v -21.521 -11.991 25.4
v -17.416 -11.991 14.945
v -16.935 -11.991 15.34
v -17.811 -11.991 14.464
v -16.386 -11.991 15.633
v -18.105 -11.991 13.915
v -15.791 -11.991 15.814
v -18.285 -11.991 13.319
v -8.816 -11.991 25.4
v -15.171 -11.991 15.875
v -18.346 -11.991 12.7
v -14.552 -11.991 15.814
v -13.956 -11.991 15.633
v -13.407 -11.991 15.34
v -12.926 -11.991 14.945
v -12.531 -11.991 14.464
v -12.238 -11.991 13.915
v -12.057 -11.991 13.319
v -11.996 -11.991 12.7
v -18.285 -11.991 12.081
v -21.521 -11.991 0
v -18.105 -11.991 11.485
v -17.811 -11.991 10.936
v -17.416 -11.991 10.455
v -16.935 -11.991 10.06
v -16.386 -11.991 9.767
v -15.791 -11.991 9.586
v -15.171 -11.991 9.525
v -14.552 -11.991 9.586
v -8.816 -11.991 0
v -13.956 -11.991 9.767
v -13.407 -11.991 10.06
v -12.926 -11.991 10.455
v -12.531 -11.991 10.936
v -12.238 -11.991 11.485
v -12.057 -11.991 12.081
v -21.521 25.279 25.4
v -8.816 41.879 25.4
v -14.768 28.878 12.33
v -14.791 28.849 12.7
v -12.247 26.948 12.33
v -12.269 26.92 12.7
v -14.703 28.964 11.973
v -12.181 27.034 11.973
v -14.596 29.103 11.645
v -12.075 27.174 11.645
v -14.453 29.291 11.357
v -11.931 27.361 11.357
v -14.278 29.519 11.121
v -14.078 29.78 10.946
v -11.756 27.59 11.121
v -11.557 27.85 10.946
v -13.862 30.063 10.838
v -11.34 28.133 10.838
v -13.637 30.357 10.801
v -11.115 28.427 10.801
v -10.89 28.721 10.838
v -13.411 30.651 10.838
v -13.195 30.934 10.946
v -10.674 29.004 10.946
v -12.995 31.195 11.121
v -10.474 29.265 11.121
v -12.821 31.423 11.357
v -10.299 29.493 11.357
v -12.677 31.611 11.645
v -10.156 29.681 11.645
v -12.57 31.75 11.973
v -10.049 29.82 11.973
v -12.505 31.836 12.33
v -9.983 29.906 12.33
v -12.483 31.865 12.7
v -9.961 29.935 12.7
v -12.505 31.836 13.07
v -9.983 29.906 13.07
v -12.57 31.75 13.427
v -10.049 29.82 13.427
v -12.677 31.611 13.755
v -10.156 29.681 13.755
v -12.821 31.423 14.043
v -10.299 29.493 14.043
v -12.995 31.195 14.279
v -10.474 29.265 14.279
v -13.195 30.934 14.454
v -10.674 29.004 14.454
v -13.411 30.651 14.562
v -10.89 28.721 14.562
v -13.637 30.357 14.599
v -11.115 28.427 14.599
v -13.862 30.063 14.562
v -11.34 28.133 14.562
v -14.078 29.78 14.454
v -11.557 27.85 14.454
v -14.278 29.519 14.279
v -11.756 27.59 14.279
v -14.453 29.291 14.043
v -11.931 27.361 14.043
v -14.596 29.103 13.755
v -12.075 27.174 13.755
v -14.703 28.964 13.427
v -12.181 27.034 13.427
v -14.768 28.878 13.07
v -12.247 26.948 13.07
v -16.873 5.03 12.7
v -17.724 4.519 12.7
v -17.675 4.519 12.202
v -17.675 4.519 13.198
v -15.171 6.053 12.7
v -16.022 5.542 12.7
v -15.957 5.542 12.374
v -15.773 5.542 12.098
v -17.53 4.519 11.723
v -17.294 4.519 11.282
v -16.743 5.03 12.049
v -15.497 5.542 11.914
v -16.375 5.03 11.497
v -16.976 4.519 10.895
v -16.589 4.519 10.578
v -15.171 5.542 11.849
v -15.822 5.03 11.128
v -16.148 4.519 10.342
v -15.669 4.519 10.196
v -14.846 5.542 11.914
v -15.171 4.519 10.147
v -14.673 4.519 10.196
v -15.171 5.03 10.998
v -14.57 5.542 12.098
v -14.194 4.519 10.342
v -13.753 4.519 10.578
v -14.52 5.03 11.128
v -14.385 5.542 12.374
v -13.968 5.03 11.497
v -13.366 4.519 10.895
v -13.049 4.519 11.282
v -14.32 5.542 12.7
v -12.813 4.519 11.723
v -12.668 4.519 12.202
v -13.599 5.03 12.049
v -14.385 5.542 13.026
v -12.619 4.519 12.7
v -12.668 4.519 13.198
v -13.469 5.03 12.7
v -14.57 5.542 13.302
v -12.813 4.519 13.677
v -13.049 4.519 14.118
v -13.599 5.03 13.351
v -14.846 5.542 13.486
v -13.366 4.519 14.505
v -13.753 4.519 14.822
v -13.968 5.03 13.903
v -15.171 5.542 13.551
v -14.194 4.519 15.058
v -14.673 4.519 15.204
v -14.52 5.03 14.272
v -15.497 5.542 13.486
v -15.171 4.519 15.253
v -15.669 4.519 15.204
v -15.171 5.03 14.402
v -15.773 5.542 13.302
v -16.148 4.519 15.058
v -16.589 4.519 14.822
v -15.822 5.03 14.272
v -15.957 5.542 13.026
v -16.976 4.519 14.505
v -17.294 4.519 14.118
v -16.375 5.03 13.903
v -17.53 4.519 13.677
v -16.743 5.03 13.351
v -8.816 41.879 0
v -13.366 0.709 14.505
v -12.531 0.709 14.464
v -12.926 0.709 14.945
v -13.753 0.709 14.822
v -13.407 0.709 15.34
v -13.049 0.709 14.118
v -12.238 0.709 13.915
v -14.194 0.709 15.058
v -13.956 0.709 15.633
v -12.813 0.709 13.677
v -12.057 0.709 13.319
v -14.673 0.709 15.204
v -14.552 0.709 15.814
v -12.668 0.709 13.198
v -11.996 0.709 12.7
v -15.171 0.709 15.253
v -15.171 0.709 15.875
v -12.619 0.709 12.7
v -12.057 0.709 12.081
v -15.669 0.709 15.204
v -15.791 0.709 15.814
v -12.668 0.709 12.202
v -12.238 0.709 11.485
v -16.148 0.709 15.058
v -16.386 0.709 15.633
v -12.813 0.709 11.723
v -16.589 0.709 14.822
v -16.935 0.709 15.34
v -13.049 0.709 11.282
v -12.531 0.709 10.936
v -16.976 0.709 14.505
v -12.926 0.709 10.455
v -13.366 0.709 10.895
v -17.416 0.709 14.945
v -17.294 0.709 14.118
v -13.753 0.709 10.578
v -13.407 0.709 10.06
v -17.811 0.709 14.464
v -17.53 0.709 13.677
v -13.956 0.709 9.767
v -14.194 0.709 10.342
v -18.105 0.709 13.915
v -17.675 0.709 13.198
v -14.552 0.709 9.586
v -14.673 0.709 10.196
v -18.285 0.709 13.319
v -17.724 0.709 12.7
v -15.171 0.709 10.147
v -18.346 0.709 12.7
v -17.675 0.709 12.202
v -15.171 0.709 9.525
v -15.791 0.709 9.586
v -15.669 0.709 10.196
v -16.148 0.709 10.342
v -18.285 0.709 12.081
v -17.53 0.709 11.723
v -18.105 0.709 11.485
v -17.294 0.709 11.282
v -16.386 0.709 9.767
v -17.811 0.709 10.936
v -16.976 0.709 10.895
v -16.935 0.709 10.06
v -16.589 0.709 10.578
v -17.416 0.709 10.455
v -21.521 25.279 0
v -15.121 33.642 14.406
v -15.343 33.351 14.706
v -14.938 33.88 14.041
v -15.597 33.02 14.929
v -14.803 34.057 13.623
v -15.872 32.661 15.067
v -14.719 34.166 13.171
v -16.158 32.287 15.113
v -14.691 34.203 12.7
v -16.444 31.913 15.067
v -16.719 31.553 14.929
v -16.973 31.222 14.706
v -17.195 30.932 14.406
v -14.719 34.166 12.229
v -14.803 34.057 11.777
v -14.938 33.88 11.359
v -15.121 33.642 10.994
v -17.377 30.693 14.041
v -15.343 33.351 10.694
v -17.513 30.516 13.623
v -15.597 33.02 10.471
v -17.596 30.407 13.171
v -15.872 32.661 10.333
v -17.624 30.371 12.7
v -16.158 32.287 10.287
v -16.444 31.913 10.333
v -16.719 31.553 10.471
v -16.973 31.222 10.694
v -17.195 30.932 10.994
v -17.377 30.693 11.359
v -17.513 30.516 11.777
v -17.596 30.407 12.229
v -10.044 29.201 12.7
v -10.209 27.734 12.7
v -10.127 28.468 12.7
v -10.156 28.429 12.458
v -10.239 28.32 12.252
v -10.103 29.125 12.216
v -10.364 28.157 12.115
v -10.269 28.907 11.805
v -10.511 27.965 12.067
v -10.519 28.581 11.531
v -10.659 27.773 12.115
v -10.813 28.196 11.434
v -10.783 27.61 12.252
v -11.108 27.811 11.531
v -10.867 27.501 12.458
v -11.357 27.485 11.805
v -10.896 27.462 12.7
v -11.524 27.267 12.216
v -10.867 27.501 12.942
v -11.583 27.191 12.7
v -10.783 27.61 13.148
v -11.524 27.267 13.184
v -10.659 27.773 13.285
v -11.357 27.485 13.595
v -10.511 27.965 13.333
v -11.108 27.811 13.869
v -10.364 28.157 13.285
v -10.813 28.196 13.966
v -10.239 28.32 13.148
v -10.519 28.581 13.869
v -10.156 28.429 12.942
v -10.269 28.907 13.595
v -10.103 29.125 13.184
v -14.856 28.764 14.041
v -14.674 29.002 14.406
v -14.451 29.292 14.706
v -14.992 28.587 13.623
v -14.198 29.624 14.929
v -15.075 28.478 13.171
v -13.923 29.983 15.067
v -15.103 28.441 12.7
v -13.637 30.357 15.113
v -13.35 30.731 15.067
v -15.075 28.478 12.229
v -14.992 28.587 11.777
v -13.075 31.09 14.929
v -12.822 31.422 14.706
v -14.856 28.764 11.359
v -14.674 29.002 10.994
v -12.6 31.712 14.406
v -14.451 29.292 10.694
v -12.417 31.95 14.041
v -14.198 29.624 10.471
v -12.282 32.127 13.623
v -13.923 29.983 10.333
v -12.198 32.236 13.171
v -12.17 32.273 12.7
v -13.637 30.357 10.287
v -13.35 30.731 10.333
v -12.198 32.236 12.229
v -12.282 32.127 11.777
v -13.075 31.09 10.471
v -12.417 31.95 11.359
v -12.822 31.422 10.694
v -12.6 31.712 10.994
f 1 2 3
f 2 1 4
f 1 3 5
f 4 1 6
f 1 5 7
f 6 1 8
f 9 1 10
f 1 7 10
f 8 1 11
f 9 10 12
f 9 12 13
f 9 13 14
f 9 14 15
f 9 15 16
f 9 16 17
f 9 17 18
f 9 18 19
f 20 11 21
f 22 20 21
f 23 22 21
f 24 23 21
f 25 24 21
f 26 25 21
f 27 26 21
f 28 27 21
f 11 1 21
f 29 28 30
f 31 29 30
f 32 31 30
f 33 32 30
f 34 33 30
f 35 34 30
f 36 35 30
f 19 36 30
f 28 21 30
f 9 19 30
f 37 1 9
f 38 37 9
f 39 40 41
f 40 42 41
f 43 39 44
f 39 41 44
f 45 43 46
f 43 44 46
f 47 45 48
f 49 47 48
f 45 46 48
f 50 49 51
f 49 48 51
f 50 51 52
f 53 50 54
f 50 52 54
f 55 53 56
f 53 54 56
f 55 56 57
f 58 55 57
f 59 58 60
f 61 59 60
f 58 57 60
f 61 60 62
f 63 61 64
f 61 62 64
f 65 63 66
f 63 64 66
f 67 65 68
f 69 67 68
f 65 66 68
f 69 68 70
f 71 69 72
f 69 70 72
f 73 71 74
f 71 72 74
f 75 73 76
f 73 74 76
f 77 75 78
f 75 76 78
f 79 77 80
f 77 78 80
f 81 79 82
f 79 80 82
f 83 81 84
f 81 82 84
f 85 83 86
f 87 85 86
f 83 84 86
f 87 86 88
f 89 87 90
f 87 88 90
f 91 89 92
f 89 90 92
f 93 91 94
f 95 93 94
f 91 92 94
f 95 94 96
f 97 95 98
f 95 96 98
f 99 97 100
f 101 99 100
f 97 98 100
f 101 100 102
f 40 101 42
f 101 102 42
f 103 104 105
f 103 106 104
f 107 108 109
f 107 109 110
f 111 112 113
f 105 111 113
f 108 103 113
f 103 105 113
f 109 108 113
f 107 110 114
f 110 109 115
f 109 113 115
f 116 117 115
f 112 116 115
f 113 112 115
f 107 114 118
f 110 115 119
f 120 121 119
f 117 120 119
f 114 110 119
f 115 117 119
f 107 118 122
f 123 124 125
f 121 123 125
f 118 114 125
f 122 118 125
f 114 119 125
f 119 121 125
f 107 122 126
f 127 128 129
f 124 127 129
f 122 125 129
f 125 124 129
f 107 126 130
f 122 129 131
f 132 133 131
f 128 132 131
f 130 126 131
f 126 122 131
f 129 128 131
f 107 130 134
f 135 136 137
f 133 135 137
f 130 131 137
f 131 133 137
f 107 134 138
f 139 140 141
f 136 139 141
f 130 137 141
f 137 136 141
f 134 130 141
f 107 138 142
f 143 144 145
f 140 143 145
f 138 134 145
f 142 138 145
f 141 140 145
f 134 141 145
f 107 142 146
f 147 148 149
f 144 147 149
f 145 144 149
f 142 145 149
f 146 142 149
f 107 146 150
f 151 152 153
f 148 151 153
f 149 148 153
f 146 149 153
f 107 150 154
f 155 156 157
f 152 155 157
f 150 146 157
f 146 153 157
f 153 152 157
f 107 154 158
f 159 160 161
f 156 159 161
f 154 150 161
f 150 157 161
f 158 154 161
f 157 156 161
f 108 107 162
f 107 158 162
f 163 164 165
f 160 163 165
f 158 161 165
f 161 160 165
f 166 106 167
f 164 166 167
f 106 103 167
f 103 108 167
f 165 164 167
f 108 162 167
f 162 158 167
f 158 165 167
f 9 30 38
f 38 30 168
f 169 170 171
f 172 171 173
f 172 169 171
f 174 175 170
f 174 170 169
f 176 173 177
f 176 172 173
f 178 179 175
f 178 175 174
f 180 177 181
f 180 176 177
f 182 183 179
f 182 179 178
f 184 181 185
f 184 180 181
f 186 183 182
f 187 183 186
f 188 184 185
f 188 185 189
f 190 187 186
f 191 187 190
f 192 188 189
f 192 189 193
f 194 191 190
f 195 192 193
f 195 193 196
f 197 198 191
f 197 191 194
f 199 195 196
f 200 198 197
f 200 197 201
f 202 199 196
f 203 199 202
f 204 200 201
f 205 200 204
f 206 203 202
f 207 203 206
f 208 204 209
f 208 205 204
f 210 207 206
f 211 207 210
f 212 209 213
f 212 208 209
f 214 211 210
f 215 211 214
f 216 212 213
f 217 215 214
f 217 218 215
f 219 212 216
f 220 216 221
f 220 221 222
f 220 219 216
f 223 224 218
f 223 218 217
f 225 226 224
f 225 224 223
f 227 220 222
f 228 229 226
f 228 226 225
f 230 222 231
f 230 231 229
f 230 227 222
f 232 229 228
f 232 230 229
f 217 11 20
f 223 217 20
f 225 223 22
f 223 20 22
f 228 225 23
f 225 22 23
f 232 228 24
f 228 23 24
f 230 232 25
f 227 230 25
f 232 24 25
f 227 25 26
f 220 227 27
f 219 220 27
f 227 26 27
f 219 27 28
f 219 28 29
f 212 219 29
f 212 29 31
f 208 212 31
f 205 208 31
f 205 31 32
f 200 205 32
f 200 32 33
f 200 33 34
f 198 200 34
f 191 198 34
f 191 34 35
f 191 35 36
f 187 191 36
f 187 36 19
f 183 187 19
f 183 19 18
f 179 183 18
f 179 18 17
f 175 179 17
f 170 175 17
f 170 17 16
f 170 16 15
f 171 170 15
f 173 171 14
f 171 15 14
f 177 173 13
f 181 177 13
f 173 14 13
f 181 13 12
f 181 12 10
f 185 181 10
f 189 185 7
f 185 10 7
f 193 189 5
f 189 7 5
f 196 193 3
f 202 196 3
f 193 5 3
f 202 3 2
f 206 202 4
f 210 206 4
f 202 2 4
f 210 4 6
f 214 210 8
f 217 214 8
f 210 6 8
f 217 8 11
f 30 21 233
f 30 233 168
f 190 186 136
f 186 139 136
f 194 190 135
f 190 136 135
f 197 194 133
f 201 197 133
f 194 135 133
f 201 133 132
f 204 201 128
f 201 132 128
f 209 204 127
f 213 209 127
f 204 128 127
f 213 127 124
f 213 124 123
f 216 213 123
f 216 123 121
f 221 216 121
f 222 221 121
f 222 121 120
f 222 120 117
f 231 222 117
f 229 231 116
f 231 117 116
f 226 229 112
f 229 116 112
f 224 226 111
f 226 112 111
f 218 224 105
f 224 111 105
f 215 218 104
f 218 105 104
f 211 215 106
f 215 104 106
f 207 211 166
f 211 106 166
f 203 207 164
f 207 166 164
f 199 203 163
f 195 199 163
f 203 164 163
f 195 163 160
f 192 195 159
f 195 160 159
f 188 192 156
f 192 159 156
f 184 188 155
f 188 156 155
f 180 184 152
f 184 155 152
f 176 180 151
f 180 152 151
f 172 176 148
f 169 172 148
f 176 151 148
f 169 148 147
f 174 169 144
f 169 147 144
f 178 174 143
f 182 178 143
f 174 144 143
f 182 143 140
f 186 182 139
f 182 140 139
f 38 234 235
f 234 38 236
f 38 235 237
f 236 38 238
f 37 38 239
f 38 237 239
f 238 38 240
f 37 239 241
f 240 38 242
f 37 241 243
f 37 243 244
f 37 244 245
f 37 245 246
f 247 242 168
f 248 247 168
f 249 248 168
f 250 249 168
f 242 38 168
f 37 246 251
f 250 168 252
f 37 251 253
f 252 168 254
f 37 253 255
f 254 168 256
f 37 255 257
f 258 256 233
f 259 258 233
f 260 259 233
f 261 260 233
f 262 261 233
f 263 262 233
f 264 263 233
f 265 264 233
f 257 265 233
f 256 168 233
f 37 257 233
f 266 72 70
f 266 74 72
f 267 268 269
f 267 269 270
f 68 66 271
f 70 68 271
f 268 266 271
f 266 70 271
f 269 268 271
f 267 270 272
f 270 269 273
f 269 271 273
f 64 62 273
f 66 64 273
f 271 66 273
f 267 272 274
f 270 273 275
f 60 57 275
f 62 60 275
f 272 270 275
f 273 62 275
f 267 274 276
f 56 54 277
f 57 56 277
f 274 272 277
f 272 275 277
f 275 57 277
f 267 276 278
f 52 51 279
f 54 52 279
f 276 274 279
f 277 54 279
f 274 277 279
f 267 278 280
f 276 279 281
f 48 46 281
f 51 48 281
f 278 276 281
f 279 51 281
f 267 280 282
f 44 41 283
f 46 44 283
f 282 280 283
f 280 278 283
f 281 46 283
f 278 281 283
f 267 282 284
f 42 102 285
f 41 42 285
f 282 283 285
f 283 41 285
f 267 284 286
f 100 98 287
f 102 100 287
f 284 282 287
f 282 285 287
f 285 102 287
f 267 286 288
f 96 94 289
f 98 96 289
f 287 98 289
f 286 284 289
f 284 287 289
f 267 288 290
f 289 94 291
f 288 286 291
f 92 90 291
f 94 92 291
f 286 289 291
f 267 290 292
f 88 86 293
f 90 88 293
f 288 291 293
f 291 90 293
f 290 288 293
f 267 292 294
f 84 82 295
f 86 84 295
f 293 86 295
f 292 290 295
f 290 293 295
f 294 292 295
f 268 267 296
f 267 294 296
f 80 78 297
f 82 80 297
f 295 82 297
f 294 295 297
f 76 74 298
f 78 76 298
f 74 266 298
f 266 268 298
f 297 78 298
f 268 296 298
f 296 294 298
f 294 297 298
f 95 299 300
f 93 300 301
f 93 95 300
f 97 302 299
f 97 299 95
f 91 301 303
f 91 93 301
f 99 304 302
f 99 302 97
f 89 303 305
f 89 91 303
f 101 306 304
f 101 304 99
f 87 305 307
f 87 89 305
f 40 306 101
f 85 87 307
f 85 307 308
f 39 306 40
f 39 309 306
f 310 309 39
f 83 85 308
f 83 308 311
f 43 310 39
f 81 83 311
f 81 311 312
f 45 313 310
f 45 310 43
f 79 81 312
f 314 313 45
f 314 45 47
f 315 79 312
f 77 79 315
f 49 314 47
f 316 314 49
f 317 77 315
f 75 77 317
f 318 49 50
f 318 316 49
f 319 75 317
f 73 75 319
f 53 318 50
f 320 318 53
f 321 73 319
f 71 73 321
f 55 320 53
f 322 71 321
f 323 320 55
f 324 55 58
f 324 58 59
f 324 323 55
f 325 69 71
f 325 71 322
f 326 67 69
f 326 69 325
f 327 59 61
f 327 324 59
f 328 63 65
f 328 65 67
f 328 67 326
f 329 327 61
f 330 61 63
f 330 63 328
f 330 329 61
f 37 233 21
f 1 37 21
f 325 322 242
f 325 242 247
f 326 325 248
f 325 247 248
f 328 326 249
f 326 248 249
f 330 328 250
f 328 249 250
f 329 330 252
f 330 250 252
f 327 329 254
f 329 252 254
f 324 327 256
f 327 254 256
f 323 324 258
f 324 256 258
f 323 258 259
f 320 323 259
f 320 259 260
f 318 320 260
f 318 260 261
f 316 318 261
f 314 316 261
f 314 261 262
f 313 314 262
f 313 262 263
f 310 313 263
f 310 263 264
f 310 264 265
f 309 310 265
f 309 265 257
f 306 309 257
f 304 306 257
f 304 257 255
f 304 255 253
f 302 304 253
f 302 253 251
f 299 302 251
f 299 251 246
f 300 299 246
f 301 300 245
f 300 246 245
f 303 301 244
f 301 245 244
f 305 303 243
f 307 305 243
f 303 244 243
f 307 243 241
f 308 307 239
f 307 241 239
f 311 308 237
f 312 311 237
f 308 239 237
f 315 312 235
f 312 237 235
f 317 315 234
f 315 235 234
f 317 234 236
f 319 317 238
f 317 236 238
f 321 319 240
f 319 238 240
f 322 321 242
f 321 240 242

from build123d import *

# Parameters (mm, degrees)
EXTRUDE1_DEPTH                    = 25.4
F_1_4_20_TAPPED_HOLE3_D           = 5.1054
F_1_4_20_TAPPED_HOLE3_DEPTH       = 16.51
F_1_4_20_TAPPED_HOLE3_CBORE_D     = 6.35
F_1_4_20_TAPPED_HOLE3_CBORE_DEPTH = 12.7
F_1_4_20_TAPPED_HOLE3_TIP         = 1.533816902
F_10_24_TAPPED_HOLE1_D            = 3.7973
F_10_24_TAPPED_HOLE1_DEPTH        = 6.35
F_10_24_TAPPED_HOLE1_CBORE_D      = 4.826
F_10_24_TAPPED_HOLE1_CBORE_DEPTH  = 3.175
F_10_24_TAPPED_HOLE1_TIP          = 1.140824014


with BuildPart() as part:
    # Sketch1 → Extrude1 (new body)
    with BuildSketch(Plane.XY):
        Polygon((-8.815807595, 41.879239751), (-21.52120708, 25.279287896), (-21.52120708, -11.990787033), (-8.815807595, -11.990787033), align=None)
    extrude(amount=EXTRUDE1_DEPTH)

    # 1/4-20 Tapped Hole3
    with Locations(Plane(origin=(6.946606398, -11.990787033, 18.061260674), x_dir=(-1, 0, 0), z_dir=(0, -1, 0))):
        with Locations((22.117813477, 5.361260674)):
            CounterBoreHole(F_1_4_20_TAPPED_HOLE3_D / 2, F_1_4_20_TAPPED_HOLE3_CBORE_D / 2, F_1_4_20_TAPPED_HOLE3_CBORE_DEPTH, depth=F_1_4_20_TAPPED_HOLE3_DEPTH)
            with Locations((0, 0, -(F_1_4_20_TAPPED_HOLE3_DEPTH + F_1_4_20_TAPPED_HOLE3_TIP / 2))):  # 118° drill point
                Cone(0, F_1_4_20_TAPPED_HOLE3_D / 2, F_1_4_20_TAPPED_HOLE3_TIP, mode=Mode.SUBTRACT)

    # #10-24 Tapped Hole1
    with Locations(Plane(origin=(13.322416251, 70.803434574, 18.061260674), x_dir=(0.6077917109686657, 0.794096490407672, 0), z_dir=(-0.794096490407672, 0.6077917109686657, 0))):
        with Locations((-48.503844205, 5.361260674)):
            CounterBoreHole(F_10_24_TAPPED_HOLE1_D / 2, F_10_24_TAPPED_HOLE1_CBORE_D / 2, F_10_24_TAPPED_HOLE1_CBORE_DEPTH, depth=F_10_24_TAPPED_HOLE1_DEPTH)
            with Locations((0, 0, -(F_10_24_TAPPED_HOLE1_DEPTH + F_10_24_TAPPED_HOLE1_TIP / 2))):  # 118° drill point
                Cone(0, F_10_24_TAPPED_HOLE1_D / 2, F_10_24_TAPPED_HOLE1_TIP, mode=Mode.SUBTRACT)


solid = part.part
